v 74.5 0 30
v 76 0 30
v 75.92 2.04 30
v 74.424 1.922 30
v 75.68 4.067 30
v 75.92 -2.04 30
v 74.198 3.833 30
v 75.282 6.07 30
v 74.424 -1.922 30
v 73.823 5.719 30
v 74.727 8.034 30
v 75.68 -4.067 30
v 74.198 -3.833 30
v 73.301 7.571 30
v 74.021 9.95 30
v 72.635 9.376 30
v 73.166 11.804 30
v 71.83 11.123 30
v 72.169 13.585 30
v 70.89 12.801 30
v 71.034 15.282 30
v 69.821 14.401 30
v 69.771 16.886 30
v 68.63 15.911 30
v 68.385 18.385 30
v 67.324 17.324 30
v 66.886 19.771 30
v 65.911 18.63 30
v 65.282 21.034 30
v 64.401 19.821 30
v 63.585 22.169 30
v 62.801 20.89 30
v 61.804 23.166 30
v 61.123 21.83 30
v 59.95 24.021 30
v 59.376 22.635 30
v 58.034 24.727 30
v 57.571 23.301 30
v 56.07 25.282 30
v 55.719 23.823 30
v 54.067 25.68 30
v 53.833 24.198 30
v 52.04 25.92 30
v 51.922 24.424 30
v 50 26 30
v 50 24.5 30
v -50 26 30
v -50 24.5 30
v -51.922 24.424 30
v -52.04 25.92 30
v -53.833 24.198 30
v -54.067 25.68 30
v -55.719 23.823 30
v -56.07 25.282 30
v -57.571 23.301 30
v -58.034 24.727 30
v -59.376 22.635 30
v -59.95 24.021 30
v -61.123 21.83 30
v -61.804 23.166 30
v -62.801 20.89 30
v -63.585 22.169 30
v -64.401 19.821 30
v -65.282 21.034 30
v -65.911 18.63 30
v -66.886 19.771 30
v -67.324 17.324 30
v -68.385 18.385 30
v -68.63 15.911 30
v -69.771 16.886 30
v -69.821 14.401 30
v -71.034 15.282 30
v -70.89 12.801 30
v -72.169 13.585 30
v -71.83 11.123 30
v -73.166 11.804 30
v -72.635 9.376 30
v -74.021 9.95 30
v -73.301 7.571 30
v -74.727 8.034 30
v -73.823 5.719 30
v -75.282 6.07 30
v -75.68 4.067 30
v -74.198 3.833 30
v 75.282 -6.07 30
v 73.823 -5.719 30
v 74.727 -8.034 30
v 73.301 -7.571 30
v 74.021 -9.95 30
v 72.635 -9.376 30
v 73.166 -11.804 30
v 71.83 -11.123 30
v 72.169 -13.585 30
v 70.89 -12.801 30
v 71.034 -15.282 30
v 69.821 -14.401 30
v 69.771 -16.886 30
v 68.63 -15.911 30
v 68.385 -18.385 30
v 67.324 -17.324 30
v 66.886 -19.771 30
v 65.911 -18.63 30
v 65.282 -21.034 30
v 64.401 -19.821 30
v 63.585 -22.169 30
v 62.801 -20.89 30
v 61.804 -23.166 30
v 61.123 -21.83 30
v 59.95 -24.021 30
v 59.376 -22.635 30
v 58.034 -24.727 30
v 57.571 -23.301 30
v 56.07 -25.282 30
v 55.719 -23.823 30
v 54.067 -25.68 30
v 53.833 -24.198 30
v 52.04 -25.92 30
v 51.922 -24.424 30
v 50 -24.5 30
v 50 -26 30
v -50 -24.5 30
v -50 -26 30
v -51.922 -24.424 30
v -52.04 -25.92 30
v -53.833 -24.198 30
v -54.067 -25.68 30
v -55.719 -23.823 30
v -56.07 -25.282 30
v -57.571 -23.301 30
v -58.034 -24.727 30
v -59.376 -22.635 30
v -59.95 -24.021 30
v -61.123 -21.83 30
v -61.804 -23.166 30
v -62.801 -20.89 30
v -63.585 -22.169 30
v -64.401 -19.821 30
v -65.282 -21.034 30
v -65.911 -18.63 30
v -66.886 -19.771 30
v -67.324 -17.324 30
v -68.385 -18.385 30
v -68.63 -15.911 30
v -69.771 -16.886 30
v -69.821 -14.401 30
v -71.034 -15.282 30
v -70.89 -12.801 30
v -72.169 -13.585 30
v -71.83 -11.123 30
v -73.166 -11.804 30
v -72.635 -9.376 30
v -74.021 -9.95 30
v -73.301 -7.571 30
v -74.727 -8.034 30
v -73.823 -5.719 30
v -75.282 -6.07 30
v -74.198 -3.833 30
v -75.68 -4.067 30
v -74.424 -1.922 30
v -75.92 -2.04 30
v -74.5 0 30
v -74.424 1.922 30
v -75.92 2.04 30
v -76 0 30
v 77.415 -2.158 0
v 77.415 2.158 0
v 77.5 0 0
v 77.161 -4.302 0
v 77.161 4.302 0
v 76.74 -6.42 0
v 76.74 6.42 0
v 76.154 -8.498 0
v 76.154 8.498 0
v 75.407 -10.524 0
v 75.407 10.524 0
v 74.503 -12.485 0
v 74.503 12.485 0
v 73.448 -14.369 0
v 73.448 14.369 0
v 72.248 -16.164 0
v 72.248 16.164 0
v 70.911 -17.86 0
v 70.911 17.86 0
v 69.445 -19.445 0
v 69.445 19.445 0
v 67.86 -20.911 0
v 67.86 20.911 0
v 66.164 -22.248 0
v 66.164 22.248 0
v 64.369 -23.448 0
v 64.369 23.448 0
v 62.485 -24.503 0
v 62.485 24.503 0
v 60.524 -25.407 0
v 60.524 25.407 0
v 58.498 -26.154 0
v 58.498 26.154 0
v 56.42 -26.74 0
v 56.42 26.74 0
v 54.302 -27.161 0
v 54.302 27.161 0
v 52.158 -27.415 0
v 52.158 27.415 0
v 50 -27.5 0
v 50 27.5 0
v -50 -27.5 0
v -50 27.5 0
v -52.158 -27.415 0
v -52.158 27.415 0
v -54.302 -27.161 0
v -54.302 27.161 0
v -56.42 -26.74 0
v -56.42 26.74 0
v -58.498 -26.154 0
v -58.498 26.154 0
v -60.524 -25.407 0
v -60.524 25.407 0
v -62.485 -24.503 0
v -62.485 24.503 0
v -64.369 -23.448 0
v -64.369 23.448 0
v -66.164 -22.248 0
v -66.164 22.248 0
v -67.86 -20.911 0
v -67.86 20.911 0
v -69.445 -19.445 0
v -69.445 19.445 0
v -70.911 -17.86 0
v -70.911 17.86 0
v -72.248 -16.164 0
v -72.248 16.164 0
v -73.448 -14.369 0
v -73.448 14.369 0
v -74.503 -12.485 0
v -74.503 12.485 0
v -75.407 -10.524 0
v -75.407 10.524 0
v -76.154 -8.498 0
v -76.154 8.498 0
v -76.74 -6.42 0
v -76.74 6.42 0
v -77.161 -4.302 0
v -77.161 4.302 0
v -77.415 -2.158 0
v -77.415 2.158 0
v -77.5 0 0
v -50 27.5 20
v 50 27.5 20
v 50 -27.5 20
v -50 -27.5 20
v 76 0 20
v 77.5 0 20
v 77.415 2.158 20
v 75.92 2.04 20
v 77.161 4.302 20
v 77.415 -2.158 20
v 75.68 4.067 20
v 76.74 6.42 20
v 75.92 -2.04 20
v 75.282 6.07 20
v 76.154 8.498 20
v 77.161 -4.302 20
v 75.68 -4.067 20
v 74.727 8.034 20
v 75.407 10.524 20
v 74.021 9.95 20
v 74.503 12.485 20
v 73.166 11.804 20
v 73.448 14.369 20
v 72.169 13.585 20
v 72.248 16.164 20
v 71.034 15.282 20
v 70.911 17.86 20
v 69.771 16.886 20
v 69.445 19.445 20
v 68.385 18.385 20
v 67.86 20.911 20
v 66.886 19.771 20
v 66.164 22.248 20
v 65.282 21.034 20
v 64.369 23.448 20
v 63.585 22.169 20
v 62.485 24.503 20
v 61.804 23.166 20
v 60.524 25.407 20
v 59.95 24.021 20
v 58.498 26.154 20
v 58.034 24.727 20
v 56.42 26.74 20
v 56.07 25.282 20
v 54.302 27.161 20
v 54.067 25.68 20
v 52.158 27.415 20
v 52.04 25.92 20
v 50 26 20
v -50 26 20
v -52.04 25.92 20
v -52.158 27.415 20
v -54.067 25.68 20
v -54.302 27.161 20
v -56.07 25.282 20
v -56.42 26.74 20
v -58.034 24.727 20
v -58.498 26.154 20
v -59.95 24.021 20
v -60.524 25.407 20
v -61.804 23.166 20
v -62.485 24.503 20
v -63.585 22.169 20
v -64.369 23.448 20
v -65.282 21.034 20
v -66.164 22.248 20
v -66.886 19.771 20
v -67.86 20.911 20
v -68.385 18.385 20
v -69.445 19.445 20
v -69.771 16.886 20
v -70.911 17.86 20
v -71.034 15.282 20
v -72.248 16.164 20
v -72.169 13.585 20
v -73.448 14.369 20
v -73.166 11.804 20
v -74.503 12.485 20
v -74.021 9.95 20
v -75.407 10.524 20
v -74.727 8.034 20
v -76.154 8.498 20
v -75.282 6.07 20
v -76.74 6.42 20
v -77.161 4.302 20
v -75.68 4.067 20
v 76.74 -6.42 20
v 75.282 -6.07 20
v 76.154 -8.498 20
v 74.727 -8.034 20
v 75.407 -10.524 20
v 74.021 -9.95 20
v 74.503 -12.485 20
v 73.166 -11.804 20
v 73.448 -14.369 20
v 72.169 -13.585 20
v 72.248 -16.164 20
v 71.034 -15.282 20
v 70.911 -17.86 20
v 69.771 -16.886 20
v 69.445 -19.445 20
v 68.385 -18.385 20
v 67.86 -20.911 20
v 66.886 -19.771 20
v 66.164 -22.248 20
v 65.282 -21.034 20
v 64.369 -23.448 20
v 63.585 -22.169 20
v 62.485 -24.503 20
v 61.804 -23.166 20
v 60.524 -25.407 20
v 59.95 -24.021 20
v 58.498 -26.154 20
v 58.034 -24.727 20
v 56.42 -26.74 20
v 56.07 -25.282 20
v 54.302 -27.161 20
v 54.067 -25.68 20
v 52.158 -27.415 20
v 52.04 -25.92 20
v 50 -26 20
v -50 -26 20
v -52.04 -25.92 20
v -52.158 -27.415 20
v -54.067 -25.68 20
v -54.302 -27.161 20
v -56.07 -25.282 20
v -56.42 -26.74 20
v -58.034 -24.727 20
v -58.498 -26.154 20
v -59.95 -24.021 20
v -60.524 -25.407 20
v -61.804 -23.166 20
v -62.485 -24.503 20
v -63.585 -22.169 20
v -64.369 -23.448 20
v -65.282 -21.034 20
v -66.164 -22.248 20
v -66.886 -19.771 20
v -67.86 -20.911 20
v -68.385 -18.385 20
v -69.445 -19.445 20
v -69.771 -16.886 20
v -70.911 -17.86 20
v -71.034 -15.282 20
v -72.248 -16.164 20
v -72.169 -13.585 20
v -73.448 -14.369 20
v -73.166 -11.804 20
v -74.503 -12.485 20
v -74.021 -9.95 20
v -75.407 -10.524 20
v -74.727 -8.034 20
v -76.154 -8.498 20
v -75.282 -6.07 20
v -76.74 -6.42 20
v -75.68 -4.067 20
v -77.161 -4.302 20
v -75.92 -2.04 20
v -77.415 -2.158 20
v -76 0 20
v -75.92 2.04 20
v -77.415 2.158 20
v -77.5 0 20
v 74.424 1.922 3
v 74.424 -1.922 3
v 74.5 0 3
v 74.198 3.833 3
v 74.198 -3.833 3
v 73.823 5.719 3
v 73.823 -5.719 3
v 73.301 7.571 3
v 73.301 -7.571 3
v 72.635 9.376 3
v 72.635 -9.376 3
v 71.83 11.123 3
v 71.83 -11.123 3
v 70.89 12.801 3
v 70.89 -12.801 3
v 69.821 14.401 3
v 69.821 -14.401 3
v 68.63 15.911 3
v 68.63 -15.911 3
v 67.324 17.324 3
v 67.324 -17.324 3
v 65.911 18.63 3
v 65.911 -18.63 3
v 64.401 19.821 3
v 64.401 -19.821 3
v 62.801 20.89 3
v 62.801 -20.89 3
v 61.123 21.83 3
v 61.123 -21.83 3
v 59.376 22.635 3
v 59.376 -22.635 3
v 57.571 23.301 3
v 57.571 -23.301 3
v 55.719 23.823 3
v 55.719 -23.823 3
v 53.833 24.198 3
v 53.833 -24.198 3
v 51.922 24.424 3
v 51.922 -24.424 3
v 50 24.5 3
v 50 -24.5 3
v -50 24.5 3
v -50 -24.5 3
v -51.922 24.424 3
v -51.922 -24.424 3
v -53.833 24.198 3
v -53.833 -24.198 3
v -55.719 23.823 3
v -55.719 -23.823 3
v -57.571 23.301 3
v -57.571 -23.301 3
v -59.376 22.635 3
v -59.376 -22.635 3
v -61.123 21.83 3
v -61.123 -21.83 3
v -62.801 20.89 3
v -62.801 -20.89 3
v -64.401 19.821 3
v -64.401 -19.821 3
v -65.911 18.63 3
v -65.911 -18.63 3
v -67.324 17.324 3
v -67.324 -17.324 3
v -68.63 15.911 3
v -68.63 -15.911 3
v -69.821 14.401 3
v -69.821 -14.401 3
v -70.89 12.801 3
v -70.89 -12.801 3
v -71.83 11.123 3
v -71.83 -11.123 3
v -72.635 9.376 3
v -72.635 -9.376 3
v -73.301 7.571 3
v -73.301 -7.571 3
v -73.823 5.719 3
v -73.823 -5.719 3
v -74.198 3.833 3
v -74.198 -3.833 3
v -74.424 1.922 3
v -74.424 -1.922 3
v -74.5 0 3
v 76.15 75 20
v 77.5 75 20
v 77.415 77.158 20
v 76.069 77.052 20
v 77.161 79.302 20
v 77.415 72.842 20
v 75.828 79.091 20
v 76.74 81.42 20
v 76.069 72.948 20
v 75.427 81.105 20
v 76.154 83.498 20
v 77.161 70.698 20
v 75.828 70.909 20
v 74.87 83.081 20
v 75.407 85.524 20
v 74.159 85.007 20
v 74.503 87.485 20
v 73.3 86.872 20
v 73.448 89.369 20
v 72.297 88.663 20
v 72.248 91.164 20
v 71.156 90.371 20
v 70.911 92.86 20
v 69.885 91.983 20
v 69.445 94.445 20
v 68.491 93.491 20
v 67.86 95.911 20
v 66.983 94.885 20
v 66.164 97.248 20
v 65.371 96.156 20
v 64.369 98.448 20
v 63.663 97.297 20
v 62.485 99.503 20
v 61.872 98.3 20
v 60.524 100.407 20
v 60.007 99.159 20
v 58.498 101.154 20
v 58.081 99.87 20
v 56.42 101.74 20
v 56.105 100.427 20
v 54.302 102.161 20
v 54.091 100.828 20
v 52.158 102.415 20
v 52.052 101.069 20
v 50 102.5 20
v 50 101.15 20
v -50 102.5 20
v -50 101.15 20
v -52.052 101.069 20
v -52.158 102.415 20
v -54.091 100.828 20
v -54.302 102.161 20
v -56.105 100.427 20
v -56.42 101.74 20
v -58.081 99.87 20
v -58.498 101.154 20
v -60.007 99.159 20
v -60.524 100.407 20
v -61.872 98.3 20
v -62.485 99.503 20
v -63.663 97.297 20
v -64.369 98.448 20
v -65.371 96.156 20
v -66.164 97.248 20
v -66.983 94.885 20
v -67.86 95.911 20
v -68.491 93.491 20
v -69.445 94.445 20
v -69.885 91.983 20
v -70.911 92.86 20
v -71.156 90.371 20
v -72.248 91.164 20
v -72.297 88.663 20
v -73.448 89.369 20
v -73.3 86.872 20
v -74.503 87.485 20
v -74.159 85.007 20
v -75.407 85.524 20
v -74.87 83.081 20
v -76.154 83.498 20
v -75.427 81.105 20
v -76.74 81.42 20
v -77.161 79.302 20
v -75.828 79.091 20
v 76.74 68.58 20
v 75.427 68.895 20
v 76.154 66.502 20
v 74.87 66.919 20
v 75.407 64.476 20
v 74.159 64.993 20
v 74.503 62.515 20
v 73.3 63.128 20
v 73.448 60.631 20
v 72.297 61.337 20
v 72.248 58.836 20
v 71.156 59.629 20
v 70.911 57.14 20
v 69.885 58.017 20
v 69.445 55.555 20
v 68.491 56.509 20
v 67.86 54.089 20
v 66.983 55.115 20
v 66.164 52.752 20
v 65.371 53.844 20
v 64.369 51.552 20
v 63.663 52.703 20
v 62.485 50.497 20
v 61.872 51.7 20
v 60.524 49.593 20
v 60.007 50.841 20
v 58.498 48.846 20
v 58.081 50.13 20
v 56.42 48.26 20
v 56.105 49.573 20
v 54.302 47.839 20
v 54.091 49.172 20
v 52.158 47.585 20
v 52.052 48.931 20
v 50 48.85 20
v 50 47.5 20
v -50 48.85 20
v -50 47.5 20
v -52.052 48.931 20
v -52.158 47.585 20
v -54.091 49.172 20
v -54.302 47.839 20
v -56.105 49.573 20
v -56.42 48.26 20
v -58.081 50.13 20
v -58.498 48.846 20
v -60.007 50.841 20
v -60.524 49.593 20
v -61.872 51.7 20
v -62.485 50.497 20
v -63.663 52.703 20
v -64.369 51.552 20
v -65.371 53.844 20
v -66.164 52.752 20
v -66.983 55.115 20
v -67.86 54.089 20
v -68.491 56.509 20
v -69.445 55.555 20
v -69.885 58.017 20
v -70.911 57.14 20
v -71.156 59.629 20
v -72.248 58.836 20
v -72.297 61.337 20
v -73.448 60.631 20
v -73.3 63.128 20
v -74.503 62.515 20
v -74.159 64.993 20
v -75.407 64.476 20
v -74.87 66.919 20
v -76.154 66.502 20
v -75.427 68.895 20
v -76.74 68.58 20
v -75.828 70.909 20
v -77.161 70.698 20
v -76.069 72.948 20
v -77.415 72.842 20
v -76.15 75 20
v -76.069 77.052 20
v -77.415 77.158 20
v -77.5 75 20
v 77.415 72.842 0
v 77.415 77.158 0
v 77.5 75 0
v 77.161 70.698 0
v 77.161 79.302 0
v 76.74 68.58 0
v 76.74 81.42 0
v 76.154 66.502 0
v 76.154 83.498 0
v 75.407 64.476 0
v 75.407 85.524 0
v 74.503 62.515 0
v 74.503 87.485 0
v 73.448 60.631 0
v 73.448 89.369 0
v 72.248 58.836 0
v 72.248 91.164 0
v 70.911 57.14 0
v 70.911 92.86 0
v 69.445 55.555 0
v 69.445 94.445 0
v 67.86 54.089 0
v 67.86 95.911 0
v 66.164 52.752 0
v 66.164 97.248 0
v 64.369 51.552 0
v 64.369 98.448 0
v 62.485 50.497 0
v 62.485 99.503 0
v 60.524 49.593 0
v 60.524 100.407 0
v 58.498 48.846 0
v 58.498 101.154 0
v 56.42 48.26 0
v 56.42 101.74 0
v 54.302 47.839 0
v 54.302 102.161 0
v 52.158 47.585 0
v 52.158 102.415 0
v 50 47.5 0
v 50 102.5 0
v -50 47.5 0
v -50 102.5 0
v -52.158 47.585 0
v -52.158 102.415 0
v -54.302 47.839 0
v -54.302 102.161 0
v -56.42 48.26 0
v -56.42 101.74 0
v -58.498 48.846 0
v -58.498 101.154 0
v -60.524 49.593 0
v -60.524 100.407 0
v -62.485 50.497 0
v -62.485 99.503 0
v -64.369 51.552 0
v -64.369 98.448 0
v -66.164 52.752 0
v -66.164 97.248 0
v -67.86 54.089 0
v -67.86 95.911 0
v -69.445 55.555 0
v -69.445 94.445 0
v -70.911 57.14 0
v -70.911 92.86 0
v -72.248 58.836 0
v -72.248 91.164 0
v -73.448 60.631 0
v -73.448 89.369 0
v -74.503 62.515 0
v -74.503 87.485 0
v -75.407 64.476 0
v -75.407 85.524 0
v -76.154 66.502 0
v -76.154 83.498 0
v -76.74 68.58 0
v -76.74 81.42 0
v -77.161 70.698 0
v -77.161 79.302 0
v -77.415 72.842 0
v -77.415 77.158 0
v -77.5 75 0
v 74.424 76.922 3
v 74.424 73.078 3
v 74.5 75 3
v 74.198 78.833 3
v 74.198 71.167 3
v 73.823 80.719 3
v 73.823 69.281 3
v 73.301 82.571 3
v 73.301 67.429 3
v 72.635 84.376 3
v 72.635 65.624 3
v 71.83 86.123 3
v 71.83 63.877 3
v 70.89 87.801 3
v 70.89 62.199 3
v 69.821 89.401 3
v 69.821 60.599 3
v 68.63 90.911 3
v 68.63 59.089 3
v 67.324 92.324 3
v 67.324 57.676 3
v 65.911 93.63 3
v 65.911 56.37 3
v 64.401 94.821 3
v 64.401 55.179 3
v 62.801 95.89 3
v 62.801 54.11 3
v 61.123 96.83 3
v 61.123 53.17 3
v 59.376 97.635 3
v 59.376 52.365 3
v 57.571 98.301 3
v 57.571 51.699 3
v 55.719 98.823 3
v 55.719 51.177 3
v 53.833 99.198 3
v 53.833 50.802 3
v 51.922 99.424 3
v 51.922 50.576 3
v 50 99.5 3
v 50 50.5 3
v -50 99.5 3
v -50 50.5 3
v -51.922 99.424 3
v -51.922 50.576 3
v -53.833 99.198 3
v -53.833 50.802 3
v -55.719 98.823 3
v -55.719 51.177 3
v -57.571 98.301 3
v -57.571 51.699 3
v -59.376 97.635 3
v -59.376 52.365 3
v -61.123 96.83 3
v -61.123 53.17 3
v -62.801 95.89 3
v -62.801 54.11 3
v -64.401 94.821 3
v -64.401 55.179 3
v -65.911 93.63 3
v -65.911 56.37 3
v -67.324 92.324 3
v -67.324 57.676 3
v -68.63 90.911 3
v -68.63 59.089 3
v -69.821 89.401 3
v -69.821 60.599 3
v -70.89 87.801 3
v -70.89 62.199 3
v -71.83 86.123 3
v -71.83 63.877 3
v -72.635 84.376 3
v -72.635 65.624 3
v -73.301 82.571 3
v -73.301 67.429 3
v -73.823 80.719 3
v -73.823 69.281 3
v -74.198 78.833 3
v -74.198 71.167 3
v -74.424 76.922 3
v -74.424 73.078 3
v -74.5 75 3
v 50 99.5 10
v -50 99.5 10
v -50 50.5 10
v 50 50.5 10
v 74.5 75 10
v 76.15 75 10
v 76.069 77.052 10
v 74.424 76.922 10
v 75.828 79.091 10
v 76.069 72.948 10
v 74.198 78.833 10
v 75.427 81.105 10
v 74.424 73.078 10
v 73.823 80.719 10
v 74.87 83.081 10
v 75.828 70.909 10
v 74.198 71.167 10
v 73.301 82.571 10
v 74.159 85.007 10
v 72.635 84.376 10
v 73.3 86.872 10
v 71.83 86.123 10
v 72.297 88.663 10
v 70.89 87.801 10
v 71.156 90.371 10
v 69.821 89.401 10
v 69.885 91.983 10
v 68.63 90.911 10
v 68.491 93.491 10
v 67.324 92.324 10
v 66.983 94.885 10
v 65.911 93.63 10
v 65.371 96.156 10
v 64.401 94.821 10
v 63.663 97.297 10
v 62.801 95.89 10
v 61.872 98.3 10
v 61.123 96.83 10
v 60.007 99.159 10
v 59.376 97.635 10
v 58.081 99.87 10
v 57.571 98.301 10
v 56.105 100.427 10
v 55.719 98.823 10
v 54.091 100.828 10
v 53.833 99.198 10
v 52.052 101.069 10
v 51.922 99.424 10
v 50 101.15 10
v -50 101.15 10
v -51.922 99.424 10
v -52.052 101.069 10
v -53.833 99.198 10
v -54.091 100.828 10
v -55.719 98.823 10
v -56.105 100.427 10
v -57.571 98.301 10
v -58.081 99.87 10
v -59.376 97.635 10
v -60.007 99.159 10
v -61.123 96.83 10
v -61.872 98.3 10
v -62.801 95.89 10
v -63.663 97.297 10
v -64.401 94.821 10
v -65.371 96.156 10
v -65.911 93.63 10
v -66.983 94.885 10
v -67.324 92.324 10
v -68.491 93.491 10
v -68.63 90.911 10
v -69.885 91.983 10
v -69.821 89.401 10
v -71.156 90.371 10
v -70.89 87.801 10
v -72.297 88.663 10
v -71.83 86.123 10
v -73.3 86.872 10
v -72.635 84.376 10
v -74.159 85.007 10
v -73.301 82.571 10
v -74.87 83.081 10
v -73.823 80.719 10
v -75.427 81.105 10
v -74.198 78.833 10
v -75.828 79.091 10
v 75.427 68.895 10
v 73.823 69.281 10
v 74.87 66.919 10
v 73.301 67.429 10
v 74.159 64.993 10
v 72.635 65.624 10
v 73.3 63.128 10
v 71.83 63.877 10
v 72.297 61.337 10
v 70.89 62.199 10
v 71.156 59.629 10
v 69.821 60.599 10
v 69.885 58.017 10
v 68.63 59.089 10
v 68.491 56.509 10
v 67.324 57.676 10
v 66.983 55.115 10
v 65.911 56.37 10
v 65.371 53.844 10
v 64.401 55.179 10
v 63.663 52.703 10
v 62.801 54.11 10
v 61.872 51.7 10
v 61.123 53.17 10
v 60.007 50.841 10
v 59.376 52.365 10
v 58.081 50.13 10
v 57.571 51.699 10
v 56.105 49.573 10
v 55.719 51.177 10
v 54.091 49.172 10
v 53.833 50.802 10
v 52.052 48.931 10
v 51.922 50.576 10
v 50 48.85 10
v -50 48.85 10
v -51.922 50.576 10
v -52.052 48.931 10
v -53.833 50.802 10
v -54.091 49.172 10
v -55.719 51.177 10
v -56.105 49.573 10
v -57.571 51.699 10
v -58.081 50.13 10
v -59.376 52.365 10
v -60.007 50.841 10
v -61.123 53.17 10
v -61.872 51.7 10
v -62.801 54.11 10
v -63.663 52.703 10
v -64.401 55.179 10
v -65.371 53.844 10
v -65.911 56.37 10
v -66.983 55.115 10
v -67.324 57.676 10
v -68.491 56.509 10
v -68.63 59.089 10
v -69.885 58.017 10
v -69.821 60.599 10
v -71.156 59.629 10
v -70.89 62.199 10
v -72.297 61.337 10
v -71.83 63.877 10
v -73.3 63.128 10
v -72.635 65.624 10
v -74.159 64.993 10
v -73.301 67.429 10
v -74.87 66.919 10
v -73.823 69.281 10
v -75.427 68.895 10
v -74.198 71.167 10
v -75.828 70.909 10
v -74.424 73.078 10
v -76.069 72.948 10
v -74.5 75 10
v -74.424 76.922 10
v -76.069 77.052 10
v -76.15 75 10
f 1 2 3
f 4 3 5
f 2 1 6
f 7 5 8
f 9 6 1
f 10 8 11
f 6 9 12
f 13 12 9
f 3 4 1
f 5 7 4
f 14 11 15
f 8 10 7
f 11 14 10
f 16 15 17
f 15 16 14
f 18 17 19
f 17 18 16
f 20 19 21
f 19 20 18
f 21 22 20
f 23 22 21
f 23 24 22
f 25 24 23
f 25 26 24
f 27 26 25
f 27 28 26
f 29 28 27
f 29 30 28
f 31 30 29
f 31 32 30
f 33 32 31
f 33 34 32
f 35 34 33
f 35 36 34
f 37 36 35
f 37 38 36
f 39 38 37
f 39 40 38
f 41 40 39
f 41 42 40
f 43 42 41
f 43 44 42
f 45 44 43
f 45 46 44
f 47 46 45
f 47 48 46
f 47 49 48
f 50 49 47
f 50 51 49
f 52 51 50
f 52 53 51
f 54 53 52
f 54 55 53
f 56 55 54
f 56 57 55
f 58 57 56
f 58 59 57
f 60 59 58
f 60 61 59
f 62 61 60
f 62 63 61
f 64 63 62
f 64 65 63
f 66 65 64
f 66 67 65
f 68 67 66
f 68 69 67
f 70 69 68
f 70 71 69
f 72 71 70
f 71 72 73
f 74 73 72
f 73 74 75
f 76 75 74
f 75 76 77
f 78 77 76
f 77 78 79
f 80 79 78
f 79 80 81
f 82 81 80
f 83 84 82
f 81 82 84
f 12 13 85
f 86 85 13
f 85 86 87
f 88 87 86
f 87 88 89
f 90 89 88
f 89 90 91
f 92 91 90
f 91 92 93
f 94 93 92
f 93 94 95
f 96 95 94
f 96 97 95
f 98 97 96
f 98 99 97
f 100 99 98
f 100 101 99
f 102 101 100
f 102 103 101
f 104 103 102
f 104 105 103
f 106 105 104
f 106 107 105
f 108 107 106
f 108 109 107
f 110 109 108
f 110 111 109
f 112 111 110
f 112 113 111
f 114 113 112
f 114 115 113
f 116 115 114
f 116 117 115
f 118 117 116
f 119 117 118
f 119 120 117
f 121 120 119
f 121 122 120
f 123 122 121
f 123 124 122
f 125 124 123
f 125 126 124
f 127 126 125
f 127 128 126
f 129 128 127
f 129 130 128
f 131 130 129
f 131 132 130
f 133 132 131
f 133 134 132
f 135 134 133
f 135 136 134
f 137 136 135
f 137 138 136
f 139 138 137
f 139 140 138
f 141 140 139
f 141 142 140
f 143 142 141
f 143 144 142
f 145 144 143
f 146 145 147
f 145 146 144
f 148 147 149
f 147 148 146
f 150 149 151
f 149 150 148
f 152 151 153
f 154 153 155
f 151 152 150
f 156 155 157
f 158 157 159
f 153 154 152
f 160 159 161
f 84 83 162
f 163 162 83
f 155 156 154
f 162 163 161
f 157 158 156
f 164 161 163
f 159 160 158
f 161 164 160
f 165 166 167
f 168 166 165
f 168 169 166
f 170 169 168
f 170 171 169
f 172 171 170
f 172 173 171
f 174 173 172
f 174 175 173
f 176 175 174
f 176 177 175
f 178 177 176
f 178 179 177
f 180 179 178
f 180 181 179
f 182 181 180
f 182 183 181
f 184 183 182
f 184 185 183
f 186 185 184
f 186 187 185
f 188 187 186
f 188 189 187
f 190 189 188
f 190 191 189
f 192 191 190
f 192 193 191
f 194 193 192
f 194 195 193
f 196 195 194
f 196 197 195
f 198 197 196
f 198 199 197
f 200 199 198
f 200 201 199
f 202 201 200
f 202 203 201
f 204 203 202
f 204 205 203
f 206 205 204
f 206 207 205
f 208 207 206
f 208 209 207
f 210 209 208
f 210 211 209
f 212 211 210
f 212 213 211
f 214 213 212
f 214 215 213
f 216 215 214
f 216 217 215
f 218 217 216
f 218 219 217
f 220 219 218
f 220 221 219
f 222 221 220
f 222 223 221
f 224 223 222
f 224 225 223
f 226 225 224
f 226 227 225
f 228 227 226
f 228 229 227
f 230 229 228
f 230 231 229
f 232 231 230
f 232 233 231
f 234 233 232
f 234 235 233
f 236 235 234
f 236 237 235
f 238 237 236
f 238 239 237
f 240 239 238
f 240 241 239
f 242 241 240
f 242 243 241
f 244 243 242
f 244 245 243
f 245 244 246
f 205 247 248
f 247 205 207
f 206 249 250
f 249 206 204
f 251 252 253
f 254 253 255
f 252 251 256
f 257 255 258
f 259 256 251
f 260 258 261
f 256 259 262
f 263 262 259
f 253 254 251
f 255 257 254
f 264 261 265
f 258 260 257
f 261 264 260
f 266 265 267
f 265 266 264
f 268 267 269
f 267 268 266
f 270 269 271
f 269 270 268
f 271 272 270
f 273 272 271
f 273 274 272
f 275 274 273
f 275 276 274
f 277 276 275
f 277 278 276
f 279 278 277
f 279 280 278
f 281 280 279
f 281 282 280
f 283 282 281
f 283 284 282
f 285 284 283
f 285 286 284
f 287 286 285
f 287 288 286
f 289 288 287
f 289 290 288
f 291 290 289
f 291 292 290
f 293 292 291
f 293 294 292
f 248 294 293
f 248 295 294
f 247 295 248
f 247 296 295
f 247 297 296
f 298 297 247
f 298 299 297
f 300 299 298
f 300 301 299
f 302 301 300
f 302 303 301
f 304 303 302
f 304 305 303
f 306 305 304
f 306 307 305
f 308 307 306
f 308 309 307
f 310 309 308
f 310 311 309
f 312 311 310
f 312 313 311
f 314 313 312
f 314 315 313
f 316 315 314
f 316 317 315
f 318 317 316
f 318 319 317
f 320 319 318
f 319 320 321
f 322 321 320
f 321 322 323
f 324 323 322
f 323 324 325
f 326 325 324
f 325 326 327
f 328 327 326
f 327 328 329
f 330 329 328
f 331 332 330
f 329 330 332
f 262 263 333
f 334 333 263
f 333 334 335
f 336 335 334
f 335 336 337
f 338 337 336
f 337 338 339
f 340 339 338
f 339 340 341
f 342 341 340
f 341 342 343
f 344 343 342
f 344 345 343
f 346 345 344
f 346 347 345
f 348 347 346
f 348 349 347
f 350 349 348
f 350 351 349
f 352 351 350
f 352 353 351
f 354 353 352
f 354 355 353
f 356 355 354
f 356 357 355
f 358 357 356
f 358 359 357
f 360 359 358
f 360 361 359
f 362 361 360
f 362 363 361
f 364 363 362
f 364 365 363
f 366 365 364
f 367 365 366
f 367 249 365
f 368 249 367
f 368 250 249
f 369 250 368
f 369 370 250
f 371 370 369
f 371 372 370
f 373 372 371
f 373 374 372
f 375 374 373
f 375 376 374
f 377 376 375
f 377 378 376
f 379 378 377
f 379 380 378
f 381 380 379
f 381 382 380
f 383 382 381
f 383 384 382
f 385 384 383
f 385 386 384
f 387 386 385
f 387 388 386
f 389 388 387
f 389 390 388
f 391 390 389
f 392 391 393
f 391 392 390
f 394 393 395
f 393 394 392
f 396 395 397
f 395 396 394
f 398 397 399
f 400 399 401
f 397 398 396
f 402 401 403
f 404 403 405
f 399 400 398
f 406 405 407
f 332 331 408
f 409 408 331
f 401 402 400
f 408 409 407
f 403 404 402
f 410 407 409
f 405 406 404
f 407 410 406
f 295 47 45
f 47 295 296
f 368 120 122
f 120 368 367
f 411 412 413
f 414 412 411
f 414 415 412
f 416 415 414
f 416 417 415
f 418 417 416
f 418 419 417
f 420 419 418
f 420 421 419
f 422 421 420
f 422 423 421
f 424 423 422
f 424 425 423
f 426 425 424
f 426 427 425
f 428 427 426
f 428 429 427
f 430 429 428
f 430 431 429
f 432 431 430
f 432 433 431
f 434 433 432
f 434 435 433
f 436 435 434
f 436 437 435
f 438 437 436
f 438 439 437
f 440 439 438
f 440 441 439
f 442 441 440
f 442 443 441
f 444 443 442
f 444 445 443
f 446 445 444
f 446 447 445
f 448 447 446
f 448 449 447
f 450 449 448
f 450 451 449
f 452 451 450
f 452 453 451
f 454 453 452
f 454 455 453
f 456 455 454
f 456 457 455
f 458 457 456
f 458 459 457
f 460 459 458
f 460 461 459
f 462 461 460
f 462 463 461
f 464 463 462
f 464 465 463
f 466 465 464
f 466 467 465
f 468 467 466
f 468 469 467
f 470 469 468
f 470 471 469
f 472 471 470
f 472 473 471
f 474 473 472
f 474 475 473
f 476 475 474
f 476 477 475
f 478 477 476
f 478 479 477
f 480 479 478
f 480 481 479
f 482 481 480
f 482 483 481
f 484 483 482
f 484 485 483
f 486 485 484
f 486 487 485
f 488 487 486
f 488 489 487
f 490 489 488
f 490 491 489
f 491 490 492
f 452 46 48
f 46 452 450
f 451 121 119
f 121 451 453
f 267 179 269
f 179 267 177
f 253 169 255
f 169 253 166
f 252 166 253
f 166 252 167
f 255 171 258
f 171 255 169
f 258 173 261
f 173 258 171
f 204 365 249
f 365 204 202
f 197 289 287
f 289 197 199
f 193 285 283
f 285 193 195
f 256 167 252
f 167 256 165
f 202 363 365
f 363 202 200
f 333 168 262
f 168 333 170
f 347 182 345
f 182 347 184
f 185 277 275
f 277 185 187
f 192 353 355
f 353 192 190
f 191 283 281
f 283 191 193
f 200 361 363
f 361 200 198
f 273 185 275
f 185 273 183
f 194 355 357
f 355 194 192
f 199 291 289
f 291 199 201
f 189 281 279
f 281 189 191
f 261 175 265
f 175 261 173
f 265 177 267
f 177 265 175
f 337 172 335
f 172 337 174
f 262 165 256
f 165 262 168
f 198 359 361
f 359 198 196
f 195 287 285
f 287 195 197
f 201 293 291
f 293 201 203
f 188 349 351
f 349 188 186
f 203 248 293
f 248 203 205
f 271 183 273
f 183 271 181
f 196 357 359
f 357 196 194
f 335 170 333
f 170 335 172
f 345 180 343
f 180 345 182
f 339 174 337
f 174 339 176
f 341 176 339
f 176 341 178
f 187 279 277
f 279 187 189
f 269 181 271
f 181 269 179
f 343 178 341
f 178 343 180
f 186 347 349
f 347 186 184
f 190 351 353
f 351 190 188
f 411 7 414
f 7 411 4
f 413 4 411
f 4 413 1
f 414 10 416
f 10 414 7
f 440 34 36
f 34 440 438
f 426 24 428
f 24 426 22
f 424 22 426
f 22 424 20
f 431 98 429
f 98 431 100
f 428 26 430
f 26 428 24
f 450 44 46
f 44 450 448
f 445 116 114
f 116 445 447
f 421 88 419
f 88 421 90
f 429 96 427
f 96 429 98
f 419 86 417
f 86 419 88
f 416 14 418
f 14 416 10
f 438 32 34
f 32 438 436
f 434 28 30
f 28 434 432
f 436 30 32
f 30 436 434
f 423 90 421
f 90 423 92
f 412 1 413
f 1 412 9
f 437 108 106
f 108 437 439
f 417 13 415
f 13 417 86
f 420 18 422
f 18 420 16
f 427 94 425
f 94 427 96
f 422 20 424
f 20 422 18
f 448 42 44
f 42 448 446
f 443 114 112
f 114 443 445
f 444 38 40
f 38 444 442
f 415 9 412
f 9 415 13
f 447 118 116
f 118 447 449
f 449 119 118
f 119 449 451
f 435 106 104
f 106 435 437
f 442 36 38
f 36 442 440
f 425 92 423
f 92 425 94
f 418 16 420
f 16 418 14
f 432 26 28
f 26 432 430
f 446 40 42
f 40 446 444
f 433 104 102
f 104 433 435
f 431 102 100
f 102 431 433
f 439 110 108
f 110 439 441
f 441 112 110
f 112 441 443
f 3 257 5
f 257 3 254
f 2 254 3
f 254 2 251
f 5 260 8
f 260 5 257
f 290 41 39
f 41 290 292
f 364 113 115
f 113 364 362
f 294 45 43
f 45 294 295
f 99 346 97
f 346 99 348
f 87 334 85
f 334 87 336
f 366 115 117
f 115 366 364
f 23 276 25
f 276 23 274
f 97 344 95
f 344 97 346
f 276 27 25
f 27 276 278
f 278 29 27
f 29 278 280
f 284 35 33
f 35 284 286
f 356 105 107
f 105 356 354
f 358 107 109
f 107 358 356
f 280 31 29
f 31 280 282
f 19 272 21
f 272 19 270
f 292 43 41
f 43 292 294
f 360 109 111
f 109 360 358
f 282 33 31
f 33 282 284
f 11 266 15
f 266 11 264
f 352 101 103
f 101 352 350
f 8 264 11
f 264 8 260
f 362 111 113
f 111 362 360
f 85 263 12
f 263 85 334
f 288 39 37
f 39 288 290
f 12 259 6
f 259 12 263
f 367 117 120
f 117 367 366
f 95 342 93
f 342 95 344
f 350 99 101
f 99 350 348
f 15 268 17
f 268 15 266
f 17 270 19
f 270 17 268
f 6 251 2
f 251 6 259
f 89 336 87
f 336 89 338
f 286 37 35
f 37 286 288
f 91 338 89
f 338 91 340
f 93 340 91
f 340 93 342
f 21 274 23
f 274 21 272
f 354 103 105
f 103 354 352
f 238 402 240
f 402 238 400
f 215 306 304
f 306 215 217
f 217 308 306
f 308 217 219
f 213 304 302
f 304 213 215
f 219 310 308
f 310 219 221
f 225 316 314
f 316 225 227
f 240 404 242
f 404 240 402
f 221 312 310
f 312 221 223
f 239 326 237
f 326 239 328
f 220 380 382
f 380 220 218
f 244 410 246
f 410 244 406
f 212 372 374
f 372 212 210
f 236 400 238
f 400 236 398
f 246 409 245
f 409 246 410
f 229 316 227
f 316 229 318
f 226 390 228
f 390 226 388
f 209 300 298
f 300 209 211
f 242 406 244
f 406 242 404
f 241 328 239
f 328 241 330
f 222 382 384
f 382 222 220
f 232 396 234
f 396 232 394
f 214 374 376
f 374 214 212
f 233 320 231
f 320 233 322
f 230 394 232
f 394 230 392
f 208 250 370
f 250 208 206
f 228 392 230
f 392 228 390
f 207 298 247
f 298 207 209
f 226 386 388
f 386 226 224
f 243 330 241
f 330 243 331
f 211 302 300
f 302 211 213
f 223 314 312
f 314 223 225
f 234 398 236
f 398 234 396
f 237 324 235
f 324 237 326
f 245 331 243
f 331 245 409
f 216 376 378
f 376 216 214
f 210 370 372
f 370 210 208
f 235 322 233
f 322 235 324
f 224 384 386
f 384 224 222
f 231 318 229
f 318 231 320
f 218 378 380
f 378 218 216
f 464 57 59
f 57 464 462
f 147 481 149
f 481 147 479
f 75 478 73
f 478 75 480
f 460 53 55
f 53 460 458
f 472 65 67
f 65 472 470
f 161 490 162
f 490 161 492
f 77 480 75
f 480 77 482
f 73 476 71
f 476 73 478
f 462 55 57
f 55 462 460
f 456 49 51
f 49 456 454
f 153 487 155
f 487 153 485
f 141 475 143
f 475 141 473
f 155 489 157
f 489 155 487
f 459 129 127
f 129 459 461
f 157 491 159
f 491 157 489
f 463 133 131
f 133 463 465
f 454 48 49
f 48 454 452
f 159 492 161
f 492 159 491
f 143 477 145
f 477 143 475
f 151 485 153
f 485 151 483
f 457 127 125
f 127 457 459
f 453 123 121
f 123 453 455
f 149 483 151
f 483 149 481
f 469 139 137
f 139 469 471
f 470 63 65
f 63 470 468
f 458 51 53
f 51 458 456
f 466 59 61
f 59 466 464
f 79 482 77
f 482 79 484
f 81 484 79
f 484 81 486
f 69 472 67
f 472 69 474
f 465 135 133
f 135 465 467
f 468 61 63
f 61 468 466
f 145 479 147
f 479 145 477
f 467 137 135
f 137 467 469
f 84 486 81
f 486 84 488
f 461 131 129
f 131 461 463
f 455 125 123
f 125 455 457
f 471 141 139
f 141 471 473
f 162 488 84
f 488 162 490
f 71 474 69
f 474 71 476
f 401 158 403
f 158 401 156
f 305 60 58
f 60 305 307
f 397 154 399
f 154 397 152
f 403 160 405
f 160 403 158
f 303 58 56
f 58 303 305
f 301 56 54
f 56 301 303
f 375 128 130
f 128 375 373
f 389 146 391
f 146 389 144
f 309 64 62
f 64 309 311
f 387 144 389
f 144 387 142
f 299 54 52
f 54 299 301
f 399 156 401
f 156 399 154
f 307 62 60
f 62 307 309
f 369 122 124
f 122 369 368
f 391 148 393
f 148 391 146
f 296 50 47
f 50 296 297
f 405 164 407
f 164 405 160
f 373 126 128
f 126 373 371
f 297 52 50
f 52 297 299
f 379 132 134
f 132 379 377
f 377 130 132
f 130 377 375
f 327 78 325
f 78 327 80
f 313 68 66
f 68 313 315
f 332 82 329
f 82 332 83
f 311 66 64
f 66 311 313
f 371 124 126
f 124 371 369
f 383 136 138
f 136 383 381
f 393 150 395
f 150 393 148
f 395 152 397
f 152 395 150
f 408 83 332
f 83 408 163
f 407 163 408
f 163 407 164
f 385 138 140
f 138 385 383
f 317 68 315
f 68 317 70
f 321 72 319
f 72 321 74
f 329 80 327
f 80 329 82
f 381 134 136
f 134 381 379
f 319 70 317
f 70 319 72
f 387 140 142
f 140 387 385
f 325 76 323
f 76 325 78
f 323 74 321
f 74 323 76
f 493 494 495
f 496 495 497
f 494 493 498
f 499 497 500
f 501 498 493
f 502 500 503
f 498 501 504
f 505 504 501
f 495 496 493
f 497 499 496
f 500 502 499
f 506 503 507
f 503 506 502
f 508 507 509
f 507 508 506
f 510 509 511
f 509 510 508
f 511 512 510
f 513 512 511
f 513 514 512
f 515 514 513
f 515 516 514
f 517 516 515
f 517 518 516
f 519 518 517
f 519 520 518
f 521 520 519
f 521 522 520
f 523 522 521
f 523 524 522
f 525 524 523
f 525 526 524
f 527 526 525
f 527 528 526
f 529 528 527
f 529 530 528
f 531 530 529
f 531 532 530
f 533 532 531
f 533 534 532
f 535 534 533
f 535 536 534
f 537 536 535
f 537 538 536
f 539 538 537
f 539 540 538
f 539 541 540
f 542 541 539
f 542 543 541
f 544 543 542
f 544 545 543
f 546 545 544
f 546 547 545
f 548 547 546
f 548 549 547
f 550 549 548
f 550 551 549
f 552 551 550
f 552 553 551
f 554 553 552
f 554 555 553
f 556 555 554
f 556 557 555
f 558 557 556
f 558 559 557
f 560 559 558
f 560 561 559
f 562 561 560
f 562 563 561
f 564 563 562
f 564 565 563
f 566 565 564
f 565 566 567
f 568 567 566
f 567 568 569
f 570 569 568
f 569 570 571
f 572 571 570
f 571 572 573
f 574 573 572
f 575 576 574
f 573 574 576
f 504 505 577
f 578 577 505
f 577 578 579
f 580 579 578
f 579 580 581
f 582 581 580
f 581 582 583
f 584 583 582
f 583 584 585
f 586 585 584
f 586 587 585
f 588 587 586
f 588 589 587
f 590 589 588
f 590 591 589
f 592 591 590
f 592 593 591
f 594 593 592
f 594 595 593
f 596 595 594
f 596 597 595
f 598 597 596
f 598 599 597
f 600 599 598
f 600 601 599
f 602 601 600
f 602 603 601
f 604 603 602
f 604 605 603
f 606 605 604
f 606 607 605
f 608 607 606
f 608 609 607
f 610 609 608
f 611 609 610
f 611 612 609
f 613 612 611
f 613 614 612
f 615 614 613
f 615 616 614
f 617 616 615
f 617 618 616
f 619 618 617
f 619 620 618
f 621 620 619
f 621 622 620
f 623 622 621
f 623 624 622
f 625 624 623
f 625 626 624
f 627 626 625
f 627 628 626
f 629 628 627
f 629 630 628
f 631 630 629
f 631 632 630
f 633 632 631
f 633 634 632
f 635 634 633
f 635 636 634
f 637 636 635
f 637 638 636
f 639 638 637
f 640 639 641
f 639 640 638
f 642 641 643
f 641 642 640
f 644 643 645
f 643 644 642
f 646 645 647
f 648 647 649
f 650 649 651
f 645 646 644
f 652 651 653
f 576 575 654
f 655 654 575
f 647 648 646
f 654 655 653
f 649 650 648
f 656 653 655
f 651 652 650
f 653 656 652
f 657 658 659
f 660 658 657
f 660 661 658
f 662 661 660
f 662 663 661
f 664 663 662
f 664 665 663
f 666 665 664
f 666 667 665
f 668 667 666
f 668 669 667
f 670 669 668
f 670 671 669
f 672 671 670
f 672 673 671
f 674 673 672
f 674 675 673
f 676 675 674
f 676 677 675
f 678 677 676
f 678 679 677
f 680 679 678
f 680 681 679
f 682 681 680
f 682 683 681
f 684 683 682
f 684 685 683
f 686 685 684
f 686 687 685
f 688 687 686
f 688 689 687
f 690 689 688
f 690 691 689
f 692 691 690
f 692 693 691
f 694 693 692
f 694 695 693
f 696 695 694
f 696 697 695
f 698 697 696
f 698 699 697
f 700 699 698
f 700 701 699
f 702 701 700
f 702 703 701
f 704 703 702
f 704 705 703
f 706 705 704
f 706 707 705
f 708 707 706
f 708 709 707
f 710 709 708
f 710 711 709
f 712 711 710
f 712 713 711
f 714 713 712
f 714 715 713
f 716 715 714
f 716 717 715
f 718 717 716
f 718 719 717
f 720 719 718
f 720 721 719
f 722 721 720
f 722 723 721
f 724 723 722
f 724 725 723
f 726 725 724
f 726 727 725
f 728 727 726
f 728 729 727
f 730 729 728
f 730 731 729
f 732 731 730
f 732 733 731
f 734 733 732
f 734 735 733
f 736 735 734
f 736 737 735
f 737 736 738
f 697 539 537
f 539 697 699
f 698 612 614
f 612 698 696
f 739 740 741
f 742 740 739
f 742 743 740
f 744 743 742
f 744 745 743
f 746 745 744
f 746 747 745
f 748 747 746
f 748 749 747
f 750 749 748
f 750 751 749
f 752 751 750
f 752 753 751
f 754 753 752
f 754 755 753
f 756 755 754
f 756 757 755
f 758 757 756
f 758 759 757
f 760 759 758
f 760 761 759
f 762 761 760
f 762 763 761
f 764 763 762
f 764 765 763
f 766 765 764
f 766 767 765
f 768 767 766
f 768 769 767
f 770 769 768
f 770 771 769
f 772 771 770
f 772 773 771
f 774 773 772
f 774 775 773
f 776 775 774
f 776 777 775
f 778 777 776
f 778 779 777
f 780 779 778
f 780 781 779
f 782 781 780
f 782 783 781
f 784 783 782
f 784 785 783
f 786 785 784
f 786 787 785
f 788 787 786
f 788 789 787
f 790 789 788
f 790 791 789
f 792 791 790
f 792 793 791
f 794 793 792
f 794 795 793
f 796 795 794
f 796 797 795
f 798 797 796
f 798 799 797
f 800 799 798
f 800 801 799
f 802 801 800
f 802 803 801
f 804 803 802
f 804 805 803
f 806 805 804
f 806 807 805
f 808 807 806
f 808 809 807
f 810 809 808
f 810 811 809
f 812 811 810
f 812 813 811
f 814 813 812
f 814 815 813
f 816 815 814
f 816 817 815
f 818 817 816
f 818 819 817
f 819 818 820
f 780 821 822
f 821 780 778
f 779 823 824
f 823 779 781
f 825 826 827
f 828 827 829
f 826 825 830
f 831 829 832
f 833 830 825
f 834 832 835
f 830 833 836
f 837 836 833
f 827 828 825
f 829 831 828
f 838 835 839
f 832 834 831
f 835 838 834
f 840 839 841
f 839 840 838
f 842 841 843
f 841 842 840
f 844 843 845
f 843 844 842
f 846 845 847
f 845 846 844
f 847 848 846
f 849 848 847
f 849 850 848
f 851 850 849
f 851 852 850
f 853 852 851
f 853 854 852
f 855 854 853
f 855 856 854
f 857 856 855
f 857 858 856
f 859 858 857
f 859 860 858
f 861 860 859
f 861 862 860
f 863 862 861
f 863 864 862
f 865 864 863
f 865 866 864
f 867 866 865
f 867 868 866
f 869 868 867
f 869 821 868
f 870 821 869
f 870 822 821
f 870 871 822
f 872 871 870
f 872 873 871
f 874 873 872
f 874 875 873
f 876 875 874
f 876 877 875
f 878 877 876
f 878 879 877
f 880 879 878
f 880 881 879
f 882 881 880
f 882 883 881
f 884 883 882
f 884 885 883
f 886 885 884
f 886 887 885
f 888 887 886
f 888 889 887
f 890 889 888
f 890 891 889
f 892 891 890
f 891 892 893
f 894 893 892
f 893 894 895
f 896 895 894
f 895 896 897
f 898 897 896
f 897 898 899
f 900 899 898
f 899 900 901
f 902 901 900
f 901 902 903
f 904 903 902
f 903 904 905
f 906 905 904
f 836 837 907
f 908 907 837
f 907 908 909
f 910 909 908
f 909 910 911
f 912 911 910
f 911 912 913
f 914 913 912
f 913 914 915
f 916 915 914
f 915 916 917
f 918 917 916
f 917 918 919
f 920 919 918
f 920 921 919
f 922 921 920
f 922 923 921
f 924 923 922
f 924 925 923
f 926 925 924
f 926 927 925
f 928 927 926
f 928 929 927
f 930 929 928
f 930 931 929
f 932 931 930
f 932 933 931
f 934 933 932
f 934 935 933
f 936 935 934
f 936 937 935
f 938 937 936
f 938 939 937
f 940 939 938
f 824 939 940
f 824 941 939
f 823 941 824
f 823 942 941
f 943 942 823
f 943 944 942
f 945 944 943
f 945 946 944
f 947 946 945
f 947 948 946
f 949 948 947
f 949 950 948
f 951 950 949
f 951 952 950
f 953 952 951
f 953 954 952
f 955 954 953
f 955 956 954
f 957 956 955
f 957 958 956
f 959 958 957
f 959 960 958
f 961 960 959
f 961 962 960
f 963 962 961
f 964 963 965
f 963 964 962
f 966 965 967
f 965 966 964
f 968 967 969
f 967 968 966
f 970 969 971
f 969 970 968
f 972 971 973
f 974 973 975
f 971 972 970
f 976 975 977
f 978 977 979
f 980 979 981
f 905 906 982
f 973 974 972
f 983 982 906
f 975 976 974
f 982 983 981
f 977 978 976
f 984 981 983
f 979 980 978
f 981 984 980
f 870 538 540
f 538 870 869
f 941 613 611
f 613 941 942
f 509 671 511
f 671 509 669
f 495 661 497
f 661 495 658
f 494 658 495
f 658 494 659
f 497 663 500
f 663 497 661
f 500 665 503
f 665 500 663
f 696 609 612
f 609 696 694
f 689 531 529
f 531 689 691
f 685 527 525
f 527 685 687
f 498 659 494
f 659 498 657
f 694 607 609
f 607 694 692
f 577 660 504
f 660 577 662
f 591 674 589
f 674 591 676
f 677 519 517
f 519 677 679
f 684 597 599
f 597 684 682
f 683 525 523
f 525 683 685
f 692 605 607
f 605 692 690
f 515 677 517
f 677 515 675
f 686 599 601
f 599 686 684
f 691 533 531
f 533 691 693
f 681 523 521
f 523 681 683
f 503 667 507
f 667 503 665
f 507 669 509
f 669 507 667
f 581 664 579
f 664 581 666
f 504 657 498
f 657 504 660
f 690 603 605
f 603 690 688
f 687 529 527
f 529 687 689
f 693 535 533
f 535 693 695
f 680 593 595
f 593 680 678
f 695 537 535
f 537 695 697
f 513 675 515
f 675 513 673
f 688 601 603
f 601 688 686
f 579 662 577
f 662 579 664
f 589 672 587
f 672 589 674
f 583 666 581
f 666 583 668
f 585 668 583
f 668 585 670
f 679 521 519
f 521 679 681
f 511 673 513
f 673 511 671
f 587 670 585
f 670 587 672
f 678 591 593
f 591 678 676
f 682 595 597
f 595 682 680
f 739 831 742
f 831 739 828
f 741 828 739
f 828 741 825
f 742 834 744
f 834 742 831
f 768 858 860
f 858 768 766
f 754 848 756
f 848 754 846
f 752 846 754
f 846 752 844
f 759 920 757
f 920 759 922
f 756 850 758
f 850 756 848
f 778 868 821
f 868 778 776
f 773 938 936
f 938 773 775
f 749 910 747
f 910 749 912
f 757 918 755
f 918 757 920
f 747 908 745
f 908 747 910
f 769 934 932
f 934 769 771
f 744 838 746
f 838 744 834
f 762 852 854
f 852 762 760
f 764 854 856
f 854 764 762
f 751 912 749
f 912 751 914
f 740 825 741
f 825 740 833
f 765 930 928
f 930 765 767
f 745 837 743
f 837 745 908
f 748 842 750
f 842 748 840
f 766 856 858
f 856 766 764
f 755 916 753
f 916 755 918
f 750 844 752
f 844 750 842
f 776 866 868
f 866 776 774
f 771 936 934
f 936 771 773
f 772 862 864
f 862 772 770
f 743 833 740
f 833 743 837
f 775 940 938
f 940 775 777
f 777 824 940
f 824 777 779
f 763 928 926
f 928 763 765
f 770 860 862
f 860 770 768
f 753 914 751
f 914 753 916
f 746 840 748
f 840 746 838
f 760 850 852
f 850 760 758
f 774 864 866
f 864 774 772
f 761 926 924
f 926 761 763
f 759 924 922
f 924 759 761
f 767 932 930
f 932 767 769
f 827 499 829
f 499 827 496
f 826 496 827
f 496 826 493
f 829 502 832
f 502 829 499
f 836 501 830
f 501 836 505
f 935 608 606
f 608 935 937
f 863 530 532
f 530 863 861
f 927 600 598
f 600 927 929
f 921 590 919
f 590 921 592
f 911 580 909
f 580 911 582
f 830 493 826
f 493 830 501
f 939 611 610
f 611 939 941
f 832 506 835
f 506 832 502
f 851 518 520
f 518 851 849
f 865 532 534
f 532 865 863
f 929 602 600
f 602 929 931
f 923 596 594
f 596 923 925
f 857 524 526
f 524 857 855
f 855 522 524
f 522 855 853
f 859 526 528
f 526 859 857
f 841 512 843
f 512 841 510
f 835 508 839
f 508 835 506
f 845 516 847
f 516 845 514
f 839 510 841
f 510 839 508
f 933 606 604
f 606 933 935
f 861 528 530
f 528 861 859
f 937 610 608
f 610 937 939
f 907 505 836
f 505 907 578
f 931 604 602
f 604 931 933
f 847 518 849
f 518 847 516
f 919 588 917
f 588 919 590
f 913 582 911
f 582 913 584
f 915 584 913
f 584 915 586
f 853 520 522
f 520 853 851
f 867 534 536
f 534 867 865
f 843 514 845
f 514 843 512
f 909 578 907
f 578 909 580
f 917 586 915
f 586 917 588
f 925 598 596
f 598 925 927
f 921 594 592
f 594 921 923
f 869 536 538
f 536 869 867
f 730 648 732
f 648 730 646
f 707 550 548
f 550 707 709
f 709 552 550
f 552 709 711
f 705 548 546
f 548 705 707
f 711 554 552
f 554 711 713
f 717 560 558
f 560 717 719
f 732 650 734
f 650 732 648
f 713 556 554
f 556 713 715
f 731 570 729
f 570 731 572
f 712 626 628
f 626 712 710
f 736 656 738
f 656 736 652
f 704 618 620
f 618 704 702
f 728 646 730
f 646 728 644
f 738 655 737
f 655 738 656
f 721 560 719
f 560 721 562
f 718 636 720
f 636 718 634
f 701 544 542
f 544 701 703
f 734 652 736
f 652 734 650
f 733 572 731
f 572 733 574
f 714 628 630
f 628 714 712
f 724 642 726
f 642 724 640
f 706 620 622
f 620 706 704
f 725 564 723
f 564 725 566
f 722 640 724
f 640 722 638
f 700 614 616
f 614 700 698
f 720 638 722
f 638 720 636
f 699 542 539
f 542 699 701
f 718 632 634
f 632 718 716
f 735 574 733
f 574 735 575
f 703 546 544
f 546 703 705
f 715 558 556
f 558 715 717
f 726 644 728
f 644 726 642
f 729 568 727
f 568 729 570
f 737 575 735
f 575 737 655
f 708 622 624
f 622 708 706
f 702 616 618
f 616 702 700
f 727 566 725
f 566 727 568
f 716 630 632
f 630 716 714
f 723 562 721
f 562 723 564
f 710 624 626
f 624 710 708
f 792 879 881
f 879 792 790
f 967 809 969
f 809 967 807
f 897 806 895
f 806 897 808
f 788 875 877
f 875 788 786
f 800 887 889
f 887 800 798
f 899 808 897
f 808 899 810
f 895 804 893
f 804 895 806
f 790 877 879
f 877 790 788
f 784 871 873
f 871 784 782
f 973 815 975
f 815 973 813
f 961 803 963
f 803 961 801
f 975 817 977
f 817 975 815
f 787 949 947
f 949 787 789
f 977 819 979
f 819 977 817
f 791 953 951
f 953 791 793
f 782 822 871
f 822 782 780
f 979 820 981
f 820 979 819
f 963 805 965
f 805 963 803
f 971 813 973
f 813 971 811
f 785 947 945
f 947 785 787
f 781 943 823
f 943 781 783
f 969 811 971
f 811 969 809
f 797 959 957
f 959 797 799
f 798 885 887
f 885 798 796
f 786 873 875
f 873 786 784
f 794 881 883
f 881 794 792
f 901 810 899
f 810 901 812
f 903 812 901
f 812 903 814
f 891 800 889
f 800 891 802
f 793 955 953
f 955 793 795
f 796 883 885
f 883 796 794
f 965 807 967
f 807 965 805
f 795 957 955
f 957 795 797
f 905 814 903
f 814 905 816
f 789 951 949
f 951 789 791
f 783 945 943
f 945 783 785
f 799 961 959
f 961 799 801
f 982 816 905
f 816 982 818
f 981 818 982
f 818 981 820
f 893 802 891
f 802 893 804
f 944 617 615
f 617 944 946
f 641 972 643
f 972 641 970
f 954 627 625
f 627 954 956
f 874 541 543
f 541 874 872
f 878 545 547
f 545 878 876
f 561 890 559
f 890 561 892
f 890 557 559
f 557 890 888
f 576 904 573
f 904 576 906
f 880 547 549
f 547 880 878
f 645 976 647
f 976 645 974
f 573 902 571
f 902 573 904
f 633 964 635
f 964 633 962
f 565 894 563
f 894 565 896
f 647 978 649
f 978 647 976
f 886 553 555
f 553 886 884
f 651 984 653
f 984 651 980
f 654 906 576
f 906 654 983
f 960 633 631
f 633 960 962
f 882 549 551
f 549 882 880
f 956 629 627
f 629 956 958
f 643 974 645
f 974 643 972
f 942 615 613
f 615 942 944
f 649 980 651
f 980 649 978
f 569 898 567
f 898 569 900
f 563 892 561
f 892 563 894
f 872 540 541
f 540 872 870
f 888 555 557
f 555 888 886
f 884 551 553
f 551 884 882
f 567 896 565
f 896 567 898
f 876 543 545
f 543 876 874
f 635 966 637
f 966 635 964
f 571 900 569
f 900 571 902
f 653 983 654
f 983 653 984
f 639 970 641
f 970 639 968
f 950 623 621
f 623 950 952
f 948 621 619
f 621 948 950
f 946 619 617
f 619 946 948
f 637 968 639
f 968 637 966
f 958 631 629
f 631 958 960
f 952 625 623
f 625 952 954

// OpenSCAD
/*
Glasses case and ronded box with lid

Author  : Dave Borghuis
Email   : contact@twenspace.nl
Website : https://twenspace.nl
Licence : (c) by TwenSpace / Dave Borghuis

If you want to use this model for e.g. commercial user please contact me.

*/

height = 30;
lengt = 155;
width = 55;
//Height of lid
heightlid = 20;

/* [Advanced parameters] */
rim = 10;

//Thickness of walls
wall = 3;
//Extra tolerance (so lid can easly open/closed)
tolerance = 0.3; //for lid extra

/* [Hidden] */
//internal parameters
//resolution of circles
$fn=80;

//Make the objects
makecase();
translate ([0,width+20,0]) makelid();

module makecase() {
    //middle part
    difference() {        
        translate([0,0,height/2]) cube([lengt-width,width,height],center=true);
        //rim1
        translate([0,width-wall/2,height/2+height-rim]) cube([lengt,width,height],center=true);
        //rim2
        translate([0,-width+wall/2,height/2+height-rim]) cube([lengt,width,height],center=true);
        //inner
        translate([0,0,height/2+wall]) cube([lengt-width,width-2*wall,height],center=true);
    }

    //left and right side
    difference() {
        union () {
            translate([lengt/2-width/2,0,height/2]) side();
            translate([-(lengt/2-width/2),0,height/2]) side();
            
        };
        translate([0,0,height/2]) cube([lengt-width,width,height],center=true);  
    };
};

module makelid() {
    //middle part
    difference() {        
        //outer
        translate([0,0,heightlid/2]) cube([lengt-width,width,heightlid],center=true);
        //remover inner 
        translate([0,0,heightlid/2+wall]) cube([lengt-width,width-2*wall,heightlid],center=true);       
        //remove rim
        translate([0,0,heightlid/2+rim/2]) cube([lengt-width,width-wall+tolerance,rim],center=true);
    };    
    
    //left and right side
    difference() {
        union () {
            translate([lengt/2-width/2,0,heightlid/2]) side_lid();
            translate([-(lengt/2-width/2),0,heightlid/2]) side_lid();        
        };
        translate([0,0,height/2]) cube([lengt-width,width,height],center=true);  
    };

};

module side() {
    difference() {
        //main cylinder
        difference() {
            cylinder(h=height,r=width/2,center=true);
            translate ([0,0,wall]) cylinder(h=height,r=width/2-wall,center=true);
        };
        //remove rim
        translate ([0,0,height/2-rim/2])
        difference() {
            cylinder(h=rim,r=width/2*1.5,center=true);
            //minus (inner)
            cylinder(h=rim,r=(width/2-wall/2),center=true);
        };
    };
};

module side_lid() {
    difference() {
        //main cylinder
        difference() {
            cylinder(h=heightlid,r=width/2,center=true);
            translate ([0,0,wall]) cylinder(h=heightlid,r=width/2-wall,center=true);
            translate ([0,0,heightlid/2-rim/2]) cylinder(h=rim,r=(width-wall+tolerance)/2,center=true);
        };
    };
};
